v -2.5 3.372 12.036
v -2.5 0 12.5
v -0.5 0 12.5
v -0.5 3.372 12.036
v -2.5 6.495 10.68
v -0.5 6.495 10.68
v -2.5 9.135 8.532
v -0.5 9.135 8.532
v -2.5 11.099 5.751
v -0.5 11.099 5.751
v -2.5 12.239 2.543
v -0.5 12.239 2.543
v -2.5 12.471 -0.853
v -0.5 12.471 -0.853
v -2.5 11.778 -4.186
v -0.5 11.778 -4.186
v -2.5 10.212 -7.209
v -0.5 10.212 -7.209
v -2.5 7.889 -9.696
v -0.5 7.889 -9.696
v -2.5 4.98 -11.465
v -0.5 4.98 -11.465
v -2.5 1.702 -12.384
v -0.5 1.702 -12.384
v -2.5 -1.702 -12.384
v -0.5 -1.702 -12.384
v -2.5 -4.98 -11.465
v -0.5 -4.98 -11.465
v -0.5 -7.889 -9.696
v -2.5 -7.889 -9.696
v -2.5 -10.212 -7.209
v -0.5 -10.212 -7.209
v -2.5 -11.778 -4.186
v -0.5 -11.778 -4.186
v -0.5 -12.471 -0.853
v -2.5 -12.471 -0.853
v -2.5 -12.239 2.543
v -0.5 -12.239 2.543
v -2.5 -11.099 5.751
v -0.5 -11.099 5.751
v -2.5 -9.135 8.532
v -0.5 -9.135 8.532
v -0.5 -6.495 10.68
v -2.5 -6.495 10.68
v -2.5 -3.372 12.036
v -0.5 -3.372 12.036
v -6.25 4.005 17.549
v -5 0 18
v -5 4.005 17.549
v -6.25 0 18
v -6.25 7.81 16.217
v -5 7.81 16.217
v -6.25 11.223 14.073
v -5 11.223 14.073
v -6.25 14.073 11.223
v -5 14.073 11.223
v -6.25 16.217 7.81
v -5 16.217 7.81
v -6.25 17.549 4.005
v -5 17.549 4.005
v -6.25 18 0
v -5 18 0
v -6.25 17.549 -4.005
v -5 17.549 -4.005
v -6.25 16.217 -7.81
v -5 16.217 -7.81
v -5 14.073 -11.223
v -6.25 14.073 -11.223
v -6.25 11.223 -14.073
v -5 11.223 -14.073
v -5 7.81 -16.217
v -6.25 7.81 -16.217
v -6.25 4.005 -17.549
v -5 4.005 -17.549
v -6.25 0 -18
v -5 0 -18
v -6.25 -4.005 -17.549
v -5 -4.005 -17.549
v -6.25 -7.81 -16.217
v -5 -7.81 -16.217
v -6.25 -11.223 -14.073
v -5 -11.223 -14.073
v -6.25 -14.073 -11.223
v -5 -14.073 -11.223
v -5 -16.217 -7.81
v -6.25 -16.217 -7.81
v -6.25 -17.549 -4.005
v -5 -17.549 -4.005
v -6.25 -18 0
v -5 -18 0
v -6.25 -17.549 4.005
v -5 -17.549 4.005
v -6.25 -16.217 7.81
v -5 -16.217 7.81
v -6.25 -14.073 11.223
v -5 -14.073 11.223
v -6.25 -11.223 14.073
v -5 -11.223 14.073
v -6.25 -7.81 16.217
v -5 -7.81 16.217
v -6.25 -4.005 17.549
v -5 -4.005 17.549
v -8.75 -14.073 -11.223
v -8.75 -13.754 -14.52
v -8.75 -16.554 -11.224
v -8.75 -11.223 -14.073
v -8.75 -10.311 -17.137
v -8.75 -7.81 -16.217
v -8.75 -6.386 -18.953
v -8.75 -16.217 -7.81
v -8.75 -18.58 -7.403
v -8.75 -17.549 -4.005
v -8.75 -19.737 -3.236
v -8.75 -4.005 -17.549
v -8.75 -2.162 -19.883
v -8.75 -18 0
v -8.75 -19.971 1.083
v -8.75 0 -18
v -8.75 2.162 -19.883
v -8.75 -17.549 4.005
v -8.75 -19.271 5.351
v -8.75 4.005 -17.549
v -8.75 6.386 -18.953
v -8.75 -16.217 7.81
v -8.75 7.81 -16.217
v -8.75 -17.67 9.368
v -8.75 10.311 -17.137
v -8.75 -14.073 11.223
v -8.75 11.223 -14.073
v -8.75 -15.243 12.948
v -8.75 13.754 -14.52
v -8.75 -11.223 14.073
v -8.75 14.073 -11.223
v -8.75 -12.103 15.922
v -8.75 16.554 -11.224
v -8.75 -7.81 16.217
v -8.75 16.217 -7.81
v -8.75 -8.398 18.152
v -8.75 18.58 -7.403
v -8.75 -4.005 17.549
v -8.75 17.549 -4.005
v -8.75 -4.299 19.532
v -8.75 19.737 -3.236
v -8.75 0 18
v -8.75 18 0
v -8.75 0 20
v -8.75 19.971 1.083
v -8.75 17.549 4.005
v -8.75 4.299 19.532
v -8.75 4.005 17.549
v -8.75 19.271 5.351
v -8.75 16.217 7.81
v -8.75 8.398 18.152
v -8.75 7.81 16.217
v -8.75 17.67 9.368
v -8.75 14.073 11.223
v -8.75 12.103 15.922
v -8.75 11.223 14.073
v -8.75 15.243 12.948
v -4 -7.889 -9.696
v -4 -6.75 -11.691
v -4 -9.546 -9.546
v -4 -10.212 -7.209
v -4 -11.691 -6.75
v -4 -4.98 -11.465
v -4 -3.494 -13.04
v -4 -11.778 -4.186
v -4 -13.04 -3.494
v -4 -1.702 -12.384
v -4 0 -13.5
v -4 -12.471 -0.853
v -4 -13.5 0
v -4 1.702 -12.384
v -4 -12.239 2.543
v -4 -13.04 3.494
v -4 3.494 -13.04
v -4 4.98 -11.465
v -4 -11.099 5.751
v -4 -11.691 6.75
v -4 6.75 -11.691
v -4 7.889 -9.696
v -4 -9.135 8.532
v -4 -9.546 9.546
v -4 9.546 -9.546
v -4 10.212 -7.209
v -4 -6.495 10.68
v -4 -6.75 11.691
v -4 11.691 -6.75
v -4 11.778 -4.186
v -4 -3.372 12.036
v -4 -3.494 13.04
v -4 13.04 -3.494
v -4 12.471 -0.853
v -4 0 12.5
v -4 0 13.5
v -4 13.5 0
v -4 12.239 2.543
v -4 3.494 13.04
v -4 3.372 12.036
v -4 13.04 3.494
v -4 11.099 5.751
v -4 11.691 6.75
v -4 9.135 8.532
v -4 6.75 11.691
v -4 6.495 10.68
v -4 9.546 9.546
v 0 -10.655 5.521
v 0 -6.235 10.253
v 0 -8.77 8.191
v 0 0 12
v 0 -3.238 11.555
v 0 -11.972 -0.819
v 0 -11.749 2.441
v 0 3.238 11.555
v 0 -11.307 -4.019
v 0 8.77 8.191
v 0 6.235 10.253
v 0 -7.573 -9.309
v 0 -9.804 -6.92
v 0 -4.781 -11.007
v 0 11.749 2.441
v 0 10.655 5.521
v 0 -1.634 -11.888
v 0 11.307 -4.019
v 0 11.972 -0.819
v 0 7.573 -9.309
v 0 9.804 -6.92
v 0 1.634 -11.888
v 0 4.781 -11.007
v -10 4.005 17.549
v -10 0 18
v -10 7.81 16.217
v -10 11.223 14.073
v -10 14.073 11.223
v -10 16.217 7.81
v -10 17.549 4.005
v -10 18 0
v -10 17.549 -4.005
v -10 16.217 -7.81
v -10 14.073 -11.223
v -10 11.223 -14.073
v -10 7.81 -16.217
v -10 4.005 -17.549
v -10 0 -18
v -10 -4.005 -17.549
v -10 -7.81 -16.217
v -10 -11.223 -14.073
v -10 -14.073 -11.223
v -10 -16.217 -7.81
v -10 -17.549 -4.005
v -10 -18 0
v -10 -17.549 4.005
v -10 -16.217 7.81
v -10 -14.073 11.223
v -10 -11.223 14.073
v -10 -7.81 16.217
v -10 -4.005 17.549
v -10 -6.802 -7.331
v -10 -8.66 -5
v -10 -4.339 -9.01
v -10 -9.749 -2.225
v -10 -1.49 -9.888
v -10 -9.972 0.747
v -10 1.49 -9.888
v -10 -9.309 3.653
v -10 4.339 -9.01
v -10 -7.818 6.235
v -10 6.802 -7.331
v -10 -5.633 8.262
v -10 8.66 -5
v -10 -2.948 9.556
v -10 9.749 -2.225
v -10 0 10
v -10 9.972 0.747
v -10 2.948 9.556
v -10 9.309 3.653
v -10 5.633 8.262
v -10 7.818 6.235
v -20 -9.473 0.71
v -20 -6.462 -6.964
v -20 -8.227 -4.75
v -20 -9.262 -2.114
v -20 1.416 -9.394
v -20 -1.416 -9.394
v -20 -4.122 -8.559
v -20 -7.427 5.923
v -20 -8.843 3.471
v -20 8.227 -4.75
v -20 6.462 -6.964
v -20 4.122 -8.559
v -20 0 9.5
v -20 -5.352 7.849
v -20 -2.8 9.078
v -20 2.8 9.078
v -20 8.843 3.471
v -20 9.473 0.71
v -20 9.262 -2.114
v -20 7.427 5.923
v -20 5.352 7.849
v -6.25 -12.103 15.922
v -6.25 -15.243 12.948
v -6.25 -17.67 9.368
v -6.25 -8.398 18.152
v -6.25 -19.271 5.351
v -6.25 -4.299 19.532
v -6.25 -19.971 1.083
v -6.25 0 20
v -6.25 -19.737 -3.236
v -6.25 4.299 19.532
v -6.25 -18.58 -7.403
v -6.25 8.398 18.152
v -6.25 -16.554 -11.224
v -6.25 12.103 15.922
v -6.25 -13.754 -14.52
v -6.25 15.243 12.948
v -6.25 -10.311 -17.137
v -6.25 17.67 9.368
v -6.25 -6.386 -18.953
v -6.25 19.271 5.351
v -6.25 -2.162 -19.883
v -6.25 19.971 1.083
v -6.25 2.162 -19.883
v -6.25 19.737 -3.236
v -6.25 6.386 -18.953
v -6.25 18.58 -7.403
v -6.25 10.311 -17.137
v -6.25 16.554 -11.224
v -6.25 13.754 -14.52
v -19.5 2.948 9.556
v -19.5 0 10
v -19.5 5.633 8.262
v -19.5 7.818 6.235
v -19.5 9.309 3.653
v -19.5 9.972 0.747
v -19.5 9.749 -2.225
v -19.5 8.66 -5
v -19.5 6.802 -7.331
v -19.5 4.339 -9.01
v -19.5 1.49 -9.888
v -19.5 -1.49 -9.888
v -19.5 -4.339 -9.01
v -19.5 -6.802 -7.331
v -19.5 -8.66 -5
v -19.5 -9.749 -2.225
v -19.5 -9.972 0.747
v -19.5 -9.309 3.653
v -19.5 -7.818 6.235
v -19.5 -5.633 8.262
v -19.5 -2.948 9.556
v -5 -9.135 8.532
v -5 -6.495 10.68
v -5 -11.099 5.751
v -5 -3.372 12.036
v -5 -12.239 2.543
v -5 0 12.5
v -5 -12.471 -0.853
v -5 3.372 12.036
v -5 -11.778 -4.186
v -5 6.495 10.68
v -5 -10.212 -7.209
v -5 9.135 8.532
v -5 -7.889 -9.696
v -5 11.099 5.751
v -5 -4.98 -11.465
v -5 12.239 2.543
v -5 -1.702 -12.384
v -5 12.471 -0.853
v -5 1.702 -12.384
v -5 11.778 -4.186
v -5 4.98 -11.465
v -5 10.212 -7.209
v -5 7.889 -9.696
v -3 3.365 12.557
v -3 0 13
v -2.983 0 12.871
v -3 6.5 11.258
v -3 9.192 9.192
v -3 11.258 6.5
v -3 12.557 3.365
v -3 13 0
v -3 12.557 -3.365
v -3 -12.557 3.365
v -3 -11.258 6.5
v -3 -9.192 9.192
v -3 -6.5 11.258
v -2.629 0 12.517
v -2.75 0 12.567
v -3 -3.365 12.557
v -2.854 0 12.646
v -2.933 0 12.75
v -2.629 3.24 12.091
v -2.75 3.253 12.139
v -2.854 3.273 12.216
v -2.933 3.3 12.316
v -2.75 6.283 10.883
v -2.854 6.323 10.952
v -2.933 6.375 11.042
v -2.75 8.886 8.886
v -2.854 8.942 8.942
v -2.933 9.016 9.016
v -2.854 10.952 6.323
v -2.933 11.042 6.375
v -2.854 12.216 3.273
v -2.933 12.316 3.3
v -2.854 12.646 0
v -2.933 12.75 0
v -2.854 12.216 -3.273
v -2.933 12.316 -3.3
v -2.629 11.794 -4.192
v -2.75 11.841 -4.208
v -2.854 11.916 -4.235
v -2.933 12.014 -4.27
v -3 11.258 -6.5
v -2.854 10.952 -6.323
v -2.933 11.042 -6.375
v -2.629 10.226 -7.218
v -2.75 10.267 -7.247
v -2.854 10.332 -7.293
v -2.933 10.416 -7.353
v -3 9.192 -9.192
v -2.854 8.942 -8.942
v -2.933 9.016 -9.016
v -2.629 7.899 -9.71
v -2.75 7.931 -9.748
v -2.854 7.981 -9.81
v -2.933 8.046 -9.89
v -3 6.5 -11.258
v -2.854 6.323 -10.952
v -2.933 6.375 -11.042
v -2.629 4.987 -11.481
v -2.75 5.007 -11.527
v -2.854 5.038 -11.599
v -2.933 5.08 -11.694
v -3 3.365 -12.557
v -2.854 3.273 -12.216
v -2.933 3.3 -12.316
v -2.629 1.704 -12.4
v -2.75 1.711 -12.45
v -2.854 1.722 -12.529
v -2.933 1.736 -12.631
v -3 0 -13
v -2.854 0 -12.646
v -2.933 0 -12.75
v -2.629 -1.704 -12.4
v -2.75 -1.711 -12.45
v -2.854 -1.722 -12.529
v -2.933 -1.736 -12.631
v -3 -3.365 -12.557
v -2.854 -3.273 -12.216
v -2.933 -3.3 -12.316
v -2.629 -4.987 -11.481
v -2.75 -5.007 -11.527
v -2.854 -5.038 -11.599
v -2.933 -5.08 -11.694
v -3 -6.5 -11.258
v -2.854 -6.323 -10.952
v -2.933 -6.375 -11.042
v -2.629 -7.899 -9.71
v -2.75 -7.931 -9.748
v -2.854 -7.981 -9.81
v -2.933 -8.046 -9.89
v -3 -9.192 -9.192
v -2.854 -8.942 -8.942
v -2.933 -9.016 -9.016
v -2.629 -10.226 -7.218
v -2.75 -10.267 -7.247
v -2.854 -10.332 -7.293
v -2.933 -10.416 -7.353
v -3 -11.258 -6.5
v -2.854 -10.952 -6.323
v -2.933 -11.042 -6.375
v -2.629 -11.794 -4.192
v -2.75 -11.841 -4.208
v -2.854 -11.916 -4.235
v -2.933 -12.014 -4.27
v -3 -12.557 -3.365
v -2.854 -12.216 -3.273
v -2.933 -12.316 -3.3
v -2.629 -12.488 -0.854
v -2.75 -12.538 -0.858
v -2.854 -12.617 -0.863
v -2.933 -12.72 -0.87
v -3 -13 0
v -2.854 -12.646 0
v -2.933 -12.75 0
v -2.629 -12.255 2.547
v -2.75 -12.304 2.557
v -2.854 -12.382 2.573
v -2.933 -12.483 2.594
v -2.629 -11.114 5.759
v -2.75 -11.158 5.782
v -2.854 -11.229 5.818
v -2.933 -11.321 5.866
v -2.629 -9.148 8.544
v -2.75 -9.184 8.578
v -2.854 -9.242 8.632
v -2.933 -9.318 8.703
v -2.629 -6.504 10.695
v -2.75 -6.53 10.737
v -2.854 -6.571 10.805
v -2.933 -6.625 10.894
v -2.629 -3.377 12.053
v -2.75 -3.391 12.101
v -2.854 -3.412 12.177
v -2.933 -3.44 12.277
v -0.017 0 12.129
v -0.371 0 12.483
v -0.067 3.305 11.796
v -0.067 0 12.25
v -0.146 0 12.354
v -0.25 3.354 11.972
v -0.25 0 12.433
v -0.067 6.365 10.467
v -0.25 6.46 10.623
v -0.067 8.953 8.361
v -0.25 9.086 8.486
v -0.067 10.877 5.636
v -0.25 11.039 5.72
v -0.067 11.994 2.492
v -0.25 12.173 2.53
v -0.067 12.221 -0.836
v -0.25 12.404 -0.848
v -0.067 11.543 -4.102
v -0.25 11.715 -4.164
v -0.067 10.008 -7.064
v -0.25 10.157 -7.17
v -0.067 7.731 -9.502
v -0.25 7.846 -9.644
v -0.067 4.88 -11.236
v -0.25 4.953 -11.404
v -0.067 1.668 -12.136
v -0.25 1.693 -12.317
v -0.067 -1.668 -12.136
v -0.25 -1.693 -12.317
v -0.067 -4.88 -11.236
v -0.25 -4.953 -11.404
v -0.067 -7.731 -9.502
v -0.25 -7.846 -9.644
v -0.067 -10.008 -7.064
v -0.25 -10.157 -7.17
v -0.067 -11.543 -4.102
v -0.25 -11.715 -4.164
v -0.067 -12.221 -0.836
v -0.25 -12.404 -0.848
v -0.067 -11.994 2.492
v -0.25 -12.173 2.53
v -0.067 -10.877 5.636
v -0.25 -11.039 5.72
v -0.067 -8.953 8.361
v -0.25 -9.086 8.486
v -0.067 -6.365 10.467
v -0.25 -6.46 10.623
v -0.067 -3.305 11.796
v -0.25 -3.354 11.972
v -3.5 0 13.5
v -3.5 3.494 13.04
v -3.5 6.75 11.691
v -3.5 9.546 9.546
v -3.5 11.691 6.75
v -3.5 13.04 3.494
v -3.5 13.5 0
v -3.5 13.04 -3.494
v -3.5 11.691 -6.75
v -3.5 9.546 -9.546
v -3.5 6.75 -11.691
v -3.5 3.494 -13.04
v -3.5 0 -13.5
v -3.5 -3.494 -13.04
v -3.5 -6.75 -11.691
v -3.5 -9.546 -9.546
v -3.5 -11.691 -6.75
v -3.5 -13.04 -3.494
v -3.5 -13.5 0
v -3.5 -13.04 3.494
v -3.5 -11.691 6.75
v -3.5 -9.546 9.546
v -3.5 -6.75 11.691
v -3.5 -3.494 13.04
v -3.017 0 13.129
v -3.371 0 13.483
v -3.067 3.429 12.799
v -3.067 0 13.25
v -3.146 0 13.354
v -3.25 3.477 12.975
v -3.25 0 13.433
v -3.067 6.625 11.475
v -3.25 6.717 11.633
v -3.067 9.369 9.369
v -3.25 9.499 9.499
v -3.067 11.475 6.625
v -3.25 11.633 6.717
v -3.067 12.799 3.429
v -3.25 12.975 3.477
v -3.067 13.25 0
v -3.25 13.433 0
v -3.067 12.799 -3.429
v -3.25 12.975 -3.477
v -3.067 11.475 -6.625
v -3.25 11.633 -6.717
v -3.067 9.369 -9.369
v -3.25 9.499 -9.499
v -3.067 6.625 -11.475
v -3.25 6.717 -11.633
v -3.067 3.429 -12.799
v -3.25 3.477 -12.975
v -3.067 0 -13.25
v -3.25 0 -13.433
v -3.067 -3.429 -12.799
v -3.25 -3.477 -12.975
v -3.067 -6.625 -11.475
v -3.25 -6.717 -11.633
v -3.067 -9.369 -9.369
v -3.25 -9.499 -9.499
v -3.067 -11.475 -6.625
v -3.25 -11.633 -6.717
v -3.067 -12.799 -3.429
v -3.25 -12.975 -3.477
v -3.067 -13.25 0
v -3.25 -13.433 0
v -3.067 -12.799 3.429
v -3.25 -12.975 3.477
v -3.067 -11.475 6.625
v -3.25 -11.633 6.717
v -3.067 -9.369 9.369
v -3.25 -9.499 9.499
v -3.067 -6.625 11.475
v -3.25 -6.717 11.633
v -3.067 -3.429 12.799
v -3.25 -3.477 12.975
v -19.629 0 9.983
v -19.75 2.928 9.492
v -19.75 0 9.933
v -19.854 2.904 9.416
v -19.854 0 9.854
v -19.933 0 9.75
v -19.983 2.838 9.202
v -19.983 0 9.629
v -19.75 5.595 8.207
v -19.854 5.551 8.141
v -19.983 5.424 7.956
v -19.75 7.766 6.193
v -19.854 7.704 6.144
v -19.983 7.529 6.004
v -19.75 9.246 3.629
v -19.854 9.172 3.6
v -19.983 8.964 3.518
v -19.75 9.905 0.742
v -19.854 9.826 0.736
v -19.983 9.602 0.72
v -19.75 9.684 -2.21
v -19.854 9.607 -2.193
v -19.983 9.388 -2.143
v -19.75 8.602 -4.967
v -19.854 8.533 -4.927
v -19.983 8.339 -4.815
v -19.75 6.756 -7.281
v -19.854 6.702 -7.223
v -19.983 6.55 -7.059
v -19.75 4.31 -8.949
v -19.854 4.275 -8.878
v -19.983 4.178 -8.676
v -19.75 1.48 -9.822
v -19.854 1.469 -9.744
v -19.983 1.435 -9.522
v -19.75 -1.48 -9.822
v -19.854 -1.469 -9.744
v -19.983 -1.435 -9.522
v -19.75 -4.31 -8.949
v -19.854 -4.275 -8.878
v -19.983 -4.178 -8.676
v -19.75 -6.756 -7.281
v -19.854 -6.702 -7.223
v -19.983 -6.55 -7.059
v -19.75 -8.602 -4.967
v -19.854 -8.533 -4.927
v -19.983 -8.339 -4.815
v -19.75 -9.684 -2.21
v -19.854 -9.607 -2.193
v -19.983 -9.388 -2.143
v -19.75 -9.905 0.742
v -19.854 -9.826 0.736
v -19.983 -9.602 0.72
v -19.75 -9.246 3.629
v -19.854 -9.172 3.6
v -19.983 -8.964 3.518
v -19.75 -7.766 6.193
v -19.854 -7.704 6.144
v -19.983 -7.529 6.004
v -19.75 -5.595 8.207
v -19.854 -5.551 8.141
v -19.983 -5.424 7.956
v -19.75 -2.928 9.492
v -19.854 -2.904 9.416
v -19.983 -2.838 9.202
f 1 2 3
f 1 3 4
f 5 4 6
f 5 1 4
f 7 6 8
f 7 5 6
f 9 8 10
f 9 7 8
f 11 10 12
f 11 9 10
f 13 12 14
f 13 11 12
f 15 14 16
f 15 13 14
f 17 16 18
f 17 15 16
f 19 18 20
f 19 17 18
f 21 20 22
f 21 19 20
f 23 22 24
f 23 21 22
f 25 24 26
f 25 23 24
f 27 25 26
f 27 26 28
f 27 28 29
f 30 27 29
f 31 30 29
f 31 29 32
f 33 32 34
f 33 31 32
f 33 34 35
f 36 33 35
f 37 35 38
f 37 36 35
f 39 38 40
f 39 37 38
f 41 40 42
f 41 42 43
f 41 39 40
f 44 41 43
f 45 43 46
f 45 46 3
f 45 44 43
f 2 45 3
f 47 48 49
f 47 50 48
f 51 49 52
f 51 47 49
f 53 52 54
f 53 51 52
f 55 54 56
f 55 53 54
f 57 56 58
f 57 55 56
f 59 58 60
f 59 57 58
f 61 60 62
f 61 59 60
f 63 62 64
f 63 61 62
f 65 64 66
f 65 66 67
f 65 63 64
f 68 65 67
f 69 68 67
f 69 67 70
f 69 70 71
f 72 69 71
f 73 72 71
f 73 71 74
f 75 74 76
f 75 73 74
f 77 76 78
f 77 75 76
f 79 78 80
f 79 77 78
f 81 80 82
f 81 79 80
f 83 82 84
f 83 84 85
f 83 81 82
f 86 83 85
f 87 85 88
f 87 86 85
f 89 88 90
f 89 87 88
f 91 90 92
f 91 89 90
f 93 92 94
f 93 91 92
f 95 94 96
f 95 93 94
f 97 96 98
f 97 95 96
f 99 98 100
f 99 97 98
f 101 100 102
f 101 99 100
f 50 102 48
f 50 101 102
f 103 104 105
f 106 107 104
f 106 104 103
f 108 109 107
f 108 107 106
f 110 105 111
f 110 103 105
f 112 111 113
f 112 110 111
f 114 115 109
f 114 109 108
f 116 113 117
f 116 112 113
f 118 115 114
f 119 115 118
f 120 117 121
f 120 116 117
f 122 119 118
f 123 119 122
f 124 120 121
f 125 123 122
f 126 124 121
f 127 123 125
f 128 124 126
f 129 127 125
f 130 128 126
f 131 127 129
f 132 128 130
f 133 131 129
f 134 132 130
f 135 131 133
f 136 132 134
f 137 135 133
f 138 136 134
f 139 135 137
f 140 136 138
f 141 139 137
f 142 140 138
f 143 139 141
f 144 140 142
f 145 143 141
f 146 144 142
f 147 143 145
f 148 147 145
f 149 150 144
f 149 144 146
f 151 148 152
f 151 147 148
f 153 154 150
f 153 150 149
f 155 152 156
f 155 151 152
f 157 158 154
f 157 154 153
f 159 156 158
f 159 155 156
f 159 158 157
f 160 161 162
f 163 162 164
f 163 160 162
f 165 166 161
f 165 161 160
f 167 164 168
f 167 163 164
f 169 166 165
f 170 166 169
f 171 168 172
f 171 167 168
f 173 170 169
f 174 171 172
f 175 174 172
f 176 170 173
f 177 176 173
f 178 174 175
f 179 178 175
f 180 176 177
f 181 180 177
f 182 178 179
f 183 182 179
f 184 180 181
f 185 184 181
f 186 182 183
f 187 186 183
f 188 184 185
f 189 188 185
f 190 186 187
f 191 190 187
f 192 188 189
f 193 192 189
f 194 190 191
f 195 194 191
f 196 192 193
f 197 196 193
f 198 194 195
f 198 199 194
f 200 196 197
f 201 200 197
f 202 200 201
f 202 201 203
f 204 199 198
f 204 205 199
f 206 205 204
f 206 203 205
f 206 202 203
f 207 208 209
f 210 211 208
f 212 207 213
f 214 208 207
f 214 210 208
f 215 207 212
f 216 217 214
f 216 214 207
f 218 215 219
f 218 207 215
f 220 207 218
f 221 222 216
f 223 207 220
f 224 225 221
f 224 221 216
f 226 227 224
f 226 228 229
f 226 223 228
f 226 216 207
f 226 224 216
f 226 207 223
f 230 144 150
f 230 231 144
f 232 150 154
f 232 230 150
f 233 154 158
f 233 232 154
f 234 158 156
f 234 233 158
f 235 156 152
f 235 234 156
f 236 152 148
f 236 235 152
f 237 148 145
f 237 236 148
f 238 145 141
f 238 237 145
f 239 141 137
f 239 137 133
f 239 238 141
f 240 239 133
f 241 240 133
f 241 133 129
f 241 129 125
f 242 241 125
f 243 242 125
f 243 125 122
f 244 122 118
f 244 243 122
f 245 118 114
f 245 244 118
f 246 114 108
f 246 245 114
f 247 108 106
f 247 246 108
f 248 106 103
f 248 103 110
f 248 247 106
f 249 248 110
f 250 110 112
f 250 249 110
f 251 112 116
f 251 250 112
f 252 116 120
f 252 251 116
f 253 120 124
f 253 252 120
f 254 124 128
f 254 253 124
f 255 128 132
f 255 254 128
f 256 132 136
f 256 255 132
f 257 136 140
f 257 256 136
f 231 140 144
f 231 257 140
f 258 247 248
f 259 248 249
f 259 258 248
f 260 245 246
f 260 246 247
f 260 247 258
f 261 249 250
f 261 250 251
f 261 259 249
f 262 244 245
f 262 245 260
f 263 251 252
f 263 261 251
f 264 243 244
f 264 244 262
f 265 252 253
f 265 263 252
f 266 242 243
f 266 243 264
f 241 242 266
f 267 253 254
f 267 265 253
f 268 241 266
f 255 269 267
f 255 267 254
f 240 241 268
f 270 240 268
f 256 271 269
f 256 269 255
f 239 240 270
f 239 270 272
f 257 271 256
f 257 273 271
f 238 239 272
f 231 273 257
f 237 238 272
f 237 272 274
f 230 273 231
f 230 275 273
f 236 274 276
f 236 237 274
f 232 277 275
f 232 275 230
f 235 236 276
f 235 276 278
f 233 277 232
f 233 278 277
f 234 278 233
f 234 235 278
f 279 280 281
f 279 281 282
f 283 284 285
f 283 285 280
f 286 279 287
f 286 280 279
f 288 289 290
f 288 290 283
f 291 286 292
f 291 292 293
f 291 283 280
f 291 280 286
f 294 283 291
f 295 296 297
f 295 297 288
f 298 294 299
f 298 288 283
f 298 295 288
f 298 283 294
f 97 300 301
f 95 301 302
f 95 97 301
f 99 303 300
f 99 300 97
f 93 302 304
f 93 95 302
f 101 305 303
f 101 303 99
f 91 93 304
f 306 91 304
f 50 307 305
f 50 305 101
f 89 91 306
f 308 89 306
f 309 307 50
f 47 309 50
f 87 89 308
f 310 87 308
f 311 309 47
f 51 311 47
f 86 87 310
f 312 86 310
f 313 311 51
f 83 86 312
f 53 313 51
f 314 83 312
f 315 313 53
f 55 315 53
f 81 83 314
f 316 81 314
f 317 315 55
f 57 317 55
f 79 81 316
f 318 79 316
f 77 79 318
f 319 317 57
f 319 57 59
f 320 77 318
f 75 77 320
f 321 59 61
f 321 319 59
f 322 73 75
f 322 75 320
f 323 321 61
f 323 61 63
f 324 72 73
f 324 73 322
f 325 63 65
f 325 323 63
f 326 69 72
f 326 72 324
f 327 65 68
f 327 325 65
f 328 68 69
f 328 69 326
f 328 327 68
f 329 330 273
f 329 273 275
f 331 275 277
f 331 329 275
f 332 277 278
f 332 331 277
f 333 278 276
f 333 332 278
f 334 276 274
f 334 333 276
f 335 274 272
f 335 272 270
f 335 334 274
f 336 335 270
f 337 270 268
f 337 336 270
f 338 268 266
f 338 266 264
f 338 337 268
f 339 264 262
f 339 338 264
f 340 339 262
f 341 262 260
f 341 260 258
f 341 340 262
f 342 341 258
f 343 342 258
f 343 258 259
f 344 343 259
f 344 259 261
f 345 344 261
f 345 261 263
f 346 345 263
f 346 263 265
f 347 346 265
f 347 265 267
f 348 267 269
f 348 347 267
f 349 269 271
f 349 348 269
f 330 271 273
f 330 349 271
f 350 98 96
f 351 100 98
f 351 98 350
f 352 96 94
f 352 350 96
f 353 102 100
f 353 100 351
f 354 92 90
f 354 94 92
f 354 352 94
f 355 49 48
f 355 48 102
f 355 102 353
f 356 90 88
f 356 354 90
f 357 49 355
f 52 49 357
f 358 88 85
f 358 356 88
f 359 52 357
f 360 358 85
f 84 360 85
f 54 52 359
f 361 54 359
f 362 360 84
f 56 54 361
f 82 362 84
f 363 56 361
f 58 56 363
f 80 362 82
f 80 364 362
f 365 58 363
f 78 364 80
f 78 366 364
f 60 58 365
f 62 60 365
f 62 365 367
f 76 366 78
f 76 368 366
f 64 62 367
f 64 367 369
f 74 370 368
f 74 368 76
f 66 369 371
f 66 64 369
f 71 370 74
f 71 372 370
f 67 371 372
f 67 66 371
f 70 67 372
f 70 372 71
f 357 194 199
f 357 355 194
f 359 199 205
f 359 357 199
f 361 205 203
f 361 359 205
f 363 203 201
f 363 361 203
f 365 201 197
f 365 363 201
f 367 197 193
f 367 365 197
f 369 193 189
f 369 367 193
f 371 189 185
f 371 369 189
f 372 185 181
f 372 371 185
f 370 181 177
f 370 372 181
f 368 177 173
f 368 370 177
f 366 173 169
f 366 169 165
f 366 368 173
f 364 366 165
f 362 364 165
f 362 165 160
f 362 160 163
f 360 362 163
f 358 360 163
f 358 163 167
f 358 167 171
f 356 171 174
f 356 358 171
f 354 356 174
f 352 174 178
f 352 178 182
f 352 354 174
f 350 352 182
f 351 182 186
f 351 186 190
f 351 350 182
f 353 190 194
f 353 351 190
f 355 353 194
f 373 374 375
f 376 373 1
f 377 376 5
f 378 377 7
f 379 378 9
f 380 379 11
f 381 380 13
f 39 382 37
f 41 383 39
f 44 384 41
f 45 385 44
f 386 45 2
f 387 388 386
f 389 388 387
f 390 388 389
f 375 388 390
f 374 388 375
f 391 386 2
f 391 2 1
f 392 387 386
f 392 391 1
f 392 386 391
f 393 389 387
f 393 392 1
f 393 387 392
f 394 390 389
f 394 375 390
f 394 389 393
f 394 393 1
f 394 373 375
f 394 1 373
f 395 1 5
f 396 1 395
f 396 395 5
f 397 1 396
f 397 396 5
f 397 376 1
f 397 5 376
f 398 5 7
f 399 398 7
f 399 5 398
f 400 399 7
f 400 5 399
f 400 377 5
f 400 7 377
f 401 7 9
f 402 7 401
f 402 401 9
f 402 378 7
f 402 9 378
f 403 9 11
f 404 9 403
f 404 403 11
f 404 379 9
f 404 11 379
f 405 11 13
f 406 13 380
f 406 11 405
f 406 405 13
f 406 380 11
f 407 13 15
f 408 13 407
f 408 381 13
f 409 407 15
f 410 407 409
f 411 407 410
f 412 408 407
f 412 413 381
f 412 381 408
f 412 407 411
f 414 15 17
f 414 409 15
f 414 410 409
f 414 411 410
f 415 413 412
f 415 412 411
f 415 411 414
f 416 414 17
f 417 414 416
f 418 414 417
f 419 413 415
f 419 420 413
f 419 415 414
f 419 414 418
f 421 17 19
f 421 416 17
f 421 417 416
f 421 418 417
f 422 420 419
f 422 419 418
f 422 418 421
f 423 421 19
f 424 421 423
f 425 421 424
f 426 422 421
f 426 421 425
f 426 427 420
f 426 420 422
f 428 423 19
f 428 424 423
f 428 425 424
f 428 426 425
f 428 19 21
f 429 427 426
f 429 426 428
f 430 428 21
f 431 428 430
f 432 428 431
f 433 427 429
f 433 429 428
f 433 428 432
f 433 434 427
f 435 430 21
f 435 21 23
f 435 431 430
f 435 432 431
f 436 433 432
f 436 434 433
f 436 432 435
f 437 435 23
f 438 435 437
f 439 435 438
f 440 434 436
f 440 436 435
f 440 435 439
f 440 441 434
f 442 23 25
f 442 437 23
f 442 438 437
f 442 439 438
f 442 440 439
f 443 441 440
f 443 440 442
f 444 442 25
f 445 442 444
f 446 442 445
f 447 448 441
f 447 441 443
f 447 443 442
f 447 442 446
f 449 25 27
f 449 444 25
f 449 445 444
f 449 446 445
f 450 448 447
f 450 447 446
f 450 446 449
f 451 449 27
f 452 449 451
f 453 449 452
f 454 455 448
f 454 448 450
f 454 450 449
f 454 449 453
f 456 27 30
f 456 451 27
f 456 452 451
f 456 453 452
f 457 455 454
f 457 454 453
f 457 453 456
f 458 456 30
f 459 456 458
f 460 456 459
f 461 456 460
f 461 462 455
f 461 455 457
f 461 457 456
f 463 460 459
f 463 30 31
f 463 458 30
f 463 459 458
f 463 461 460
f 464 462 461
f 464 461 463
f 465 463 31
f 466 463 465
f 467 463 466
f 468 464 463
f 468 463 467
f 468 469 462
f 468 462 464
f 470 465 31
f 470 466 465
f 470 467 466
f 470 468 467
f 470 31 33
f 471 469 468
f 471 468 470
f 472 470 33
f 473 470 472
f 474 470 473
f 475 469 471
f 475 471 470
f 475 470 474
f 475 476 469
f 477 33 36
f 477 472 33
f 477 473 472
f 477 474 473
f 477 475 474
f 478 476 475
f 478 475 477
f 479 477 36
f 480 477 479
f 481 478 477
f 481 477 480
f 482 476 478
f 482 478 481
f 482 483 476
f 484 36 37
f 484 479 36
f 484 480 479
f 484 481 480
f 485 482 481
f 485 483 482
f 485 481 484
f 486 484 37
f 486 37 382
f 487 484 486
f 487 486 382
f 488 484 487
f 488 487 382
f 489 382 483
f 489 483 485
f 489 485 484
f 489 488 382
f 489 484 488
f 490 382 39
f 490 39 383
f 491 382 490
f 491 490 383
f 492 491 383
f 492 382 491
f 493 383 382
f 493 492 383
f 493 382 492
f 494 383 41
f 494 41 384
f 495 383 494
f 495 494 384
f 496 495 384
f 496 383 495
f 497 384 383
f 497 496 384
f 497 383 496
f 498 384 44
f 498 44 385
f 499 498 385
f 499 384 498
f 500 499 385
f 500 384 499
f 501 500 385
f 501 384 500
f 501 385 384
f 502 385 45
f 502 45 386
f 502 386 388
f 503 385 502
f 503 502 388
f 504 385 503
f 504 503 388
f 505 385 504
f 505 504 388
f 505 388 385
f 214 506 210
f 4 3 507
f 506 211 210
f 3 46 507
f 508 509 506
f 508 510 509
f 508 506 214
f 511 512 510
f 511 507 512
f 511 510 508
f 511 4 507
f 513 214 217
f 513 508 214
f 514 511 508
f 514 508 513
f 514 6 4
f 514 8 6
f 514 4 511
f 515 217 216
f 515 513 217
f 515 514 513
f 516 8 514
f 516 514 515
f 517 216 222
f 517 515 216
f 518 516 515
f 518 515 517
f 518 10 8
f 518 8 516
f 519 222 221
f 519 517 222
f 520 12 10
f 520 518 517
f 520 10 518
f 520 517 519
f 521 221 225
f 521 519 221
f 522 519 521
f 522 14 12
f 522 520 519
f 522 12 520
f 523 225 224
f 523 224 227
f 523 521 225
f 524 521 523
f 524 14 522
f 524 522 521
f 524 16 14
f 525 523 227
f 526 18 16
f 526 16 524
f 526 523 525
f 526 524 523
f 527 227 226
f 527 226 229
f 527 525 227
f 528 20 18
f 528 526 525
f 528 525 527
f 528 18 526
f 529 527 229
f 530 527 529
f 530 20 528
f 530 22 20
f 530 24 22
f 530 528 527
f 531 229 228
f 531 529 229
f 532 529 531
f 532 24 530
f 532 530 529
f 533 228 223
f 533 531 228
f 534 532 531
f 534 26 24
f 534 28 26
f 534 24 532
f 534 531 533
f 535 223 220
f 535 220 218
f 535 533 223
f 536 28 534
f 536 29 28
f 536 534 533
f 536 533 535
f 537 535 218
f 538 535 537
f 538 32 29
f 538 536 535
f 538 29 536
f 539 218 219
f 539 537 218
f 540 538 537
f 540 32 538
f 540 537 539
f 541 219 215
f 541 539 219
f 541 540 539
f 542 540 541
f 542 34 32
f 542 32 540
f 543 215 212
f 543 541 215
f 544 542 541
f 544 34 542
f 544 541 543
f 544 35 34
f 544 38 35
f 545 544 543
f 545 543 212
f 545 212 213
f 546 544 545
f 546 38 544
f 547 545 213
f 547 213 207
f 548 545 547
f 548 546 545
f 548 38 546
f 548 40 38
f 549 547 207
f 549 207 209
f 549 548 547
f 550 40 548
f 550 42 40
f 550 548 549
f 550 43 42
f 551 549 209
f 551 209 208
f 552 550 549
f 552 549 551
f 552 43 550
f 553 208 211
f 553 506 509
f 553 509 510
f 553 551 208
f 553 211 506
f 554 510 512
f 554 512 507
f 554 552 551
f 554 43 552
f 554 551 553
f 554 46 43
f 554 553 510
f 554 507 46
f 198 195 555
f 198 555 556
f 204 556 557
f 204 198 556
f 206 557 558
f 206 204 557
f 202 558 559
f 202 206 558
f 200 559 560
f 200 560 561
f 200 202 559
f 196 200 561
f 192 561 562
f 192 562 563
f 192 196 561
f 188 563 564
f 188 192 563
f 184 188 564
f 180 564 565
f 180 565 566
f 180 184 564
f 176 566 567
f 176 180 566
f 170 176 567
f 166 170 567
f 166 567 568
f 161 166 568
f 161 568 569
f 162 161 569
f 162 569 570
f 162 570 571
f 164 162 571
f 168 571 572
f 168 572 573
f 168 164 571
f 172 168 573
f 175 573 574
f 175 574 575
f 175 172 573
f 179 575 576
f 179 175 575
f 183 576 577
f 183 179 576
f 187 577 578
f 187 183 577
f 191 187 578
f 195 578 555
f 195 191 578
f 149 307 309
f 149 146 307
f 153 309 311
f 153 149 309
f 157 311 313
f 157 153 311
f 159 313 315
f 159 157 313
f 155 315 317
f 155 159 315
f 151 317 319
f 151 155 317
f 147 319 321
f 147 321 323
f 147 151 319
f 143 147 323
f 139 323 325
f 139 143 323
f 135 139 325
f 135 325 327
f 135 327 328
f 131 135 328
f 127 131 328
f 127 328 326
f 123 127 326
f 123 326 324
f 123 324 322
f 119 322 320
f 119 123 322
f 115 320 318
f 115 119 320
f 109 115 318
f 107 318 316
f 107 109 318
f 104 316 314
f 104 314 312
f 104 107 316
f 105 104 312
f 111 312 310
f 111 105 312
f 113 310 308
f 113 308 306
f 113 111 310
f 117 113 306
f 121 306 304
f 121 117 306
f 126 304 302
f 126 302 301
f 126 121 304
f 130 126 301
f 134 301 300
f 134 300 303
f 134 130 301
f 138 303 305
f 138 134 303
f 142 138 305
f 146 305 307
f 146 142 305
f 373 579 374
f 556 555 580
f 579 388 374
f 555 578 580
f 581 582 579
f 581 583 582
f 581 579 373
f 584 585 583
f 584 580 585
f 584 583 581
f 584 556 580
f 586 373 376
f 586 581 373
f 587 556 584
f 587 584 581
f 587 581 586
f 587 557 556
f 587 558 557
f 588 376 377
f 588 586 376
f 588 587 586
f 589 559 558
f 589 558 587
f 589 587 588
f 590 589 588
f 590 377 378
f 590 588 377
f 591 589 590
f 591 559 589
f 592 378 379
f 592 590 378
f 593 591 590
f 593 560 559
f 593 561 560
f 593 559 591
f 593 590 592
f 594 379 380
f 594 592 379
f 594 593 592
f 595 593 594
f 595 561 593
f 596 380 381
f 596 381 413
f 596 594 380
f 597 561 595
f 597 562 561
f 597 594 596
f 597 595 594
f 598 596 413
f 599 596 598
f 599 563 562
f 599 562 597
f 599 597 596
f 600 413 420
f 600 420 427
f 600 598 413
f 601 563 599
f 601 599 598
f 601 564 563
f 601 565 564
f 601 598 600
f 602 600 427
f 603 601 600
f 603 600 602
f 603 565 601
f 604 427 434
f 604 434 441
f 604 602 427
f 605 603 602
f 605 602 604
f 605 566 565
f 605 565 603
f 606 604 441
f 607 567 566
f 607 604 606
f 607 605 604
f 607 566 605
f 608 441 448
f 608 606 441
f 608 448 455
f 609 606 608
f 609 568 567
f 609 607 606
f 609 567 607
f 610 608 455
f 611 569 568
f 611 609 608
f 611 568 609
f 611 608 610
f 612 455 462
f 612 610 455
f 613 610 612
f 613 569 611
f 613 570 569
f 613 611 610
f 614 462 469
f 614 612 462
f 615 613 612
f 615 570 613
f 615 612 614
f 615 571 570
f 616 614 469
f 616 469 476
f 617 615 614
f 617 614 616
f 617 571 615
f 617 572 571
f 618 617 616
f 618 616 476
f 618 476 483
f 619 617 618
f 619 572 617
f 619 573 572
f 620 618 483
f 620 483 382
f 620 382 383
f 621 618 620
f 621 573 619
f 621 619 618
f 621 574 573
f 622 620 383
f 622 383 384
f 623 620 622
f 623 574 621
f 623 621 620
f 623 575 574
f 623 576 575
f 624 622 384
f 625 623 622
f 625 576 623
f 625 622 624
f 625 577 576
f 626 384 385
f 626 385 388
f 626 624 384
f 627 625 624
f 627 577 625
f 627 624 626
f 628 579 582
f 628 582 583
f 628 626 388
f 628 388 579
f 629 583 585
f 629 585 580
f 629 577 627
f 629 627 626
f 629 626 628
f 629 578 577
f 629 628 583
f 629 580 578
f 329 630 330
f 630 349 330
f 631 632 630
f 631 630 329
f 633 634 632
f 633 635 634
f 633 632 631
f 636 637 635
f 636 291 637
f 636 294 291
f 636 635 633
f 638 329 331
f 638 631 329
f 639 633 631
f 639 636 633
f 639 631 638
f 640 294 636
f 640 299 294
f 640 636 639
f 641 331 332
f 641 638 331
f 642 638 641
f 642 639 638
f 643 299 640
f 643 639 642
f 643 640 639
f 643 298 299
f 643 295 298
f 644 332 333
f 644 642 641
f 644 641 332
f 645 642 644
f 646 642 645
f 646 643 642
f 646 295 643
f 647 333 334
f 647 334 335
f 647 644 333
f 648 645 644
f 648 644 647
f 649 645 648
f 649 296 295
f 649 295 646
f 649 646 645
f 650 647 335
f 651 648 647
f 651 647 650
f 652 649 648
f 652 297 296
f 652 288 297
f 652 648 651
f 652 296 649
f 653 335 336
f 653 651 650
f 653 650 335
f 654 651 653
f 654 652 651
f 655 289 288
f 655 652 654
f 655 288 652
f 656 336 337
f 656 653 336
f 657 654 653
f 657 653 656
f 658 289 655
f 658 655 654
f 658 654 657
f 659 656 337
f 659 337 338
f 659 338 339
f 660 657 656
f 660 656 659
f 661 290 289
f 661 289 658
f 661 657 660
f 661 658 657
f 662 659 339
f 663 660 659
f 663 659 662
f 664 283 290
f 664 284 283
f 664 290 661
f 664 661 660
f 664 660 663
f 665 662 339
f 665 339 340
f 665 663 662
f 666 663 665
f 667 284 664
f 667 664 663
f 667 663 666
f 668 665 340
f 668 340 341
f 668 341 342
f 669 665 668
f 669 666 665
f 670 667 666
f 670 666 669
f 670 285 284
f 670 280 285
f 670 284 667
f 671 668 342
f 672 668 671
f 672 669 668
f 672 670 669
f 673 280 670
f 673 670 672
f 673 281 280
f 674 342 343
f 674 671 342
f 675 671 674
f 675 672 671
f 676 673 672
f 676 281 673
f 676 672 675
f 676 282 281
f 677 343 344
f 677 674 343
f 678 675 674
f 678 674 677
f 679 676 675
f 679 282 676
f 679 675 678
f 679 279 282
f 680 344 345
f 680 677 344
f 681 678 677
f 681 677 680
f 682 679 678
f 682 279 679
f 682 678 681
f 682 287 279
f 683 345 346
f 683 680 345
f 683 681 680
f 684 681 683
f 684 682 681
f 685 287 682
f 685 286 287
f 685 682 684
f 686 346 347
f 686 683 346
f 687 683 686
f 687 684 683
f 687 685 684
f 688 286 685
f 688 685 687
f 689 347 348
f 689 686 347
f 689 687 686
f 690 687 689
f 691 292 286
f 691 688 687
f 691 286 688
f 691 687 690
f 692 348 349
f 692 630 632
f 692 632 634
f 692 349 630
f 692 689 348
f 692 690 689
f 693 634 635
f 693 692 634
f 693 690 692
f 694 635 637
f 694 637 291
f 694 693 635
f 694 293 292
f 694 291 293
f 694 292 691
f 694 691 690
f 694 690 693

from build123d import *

# Parameters (mm, degrees)
F2_R = 0.49999


# Not quite as in the source:
# - a fillet or chamfer is up to 0.001 mm smaller than in the source, because OpenCascade refuses the exact size


with BuildPart() as f1:
    # F0 (on Front) → F1 (revolve)
    with BuildSketch(Plane.XZ):
        Polygon((-20, 0), (0, 0), (0, 12.5), (-3, 12.5), (-3, 13.5), (-4, 13.5), (-4, 12.5), (-5, 12.5), (-5, 18), (-6.25, 18), (-6.25, 20), (-8.75, 20), (-8.75, 18), (-10, 18), (-10, 10), (-20, 10), align=None)
    revolve(axis=Axis((-10, 0, 0), (-1, 0, 0)))

    # F2 (radius 0.5 in the source; OpenCascade refuses exactly that, so slightly less here)
    f2_edges = [f1.edges().sort_by_distance(p)[0] for p in [
        (-20, 0, -10),
        (-3, 0, -13.5),
        (0, 0, -12.5),
        (-3, 0, -12.5),
        (-1.5, 0, 12.5),
    ]]
    fillet(f2_edges, radius=F2_R)


solid = f1.part
